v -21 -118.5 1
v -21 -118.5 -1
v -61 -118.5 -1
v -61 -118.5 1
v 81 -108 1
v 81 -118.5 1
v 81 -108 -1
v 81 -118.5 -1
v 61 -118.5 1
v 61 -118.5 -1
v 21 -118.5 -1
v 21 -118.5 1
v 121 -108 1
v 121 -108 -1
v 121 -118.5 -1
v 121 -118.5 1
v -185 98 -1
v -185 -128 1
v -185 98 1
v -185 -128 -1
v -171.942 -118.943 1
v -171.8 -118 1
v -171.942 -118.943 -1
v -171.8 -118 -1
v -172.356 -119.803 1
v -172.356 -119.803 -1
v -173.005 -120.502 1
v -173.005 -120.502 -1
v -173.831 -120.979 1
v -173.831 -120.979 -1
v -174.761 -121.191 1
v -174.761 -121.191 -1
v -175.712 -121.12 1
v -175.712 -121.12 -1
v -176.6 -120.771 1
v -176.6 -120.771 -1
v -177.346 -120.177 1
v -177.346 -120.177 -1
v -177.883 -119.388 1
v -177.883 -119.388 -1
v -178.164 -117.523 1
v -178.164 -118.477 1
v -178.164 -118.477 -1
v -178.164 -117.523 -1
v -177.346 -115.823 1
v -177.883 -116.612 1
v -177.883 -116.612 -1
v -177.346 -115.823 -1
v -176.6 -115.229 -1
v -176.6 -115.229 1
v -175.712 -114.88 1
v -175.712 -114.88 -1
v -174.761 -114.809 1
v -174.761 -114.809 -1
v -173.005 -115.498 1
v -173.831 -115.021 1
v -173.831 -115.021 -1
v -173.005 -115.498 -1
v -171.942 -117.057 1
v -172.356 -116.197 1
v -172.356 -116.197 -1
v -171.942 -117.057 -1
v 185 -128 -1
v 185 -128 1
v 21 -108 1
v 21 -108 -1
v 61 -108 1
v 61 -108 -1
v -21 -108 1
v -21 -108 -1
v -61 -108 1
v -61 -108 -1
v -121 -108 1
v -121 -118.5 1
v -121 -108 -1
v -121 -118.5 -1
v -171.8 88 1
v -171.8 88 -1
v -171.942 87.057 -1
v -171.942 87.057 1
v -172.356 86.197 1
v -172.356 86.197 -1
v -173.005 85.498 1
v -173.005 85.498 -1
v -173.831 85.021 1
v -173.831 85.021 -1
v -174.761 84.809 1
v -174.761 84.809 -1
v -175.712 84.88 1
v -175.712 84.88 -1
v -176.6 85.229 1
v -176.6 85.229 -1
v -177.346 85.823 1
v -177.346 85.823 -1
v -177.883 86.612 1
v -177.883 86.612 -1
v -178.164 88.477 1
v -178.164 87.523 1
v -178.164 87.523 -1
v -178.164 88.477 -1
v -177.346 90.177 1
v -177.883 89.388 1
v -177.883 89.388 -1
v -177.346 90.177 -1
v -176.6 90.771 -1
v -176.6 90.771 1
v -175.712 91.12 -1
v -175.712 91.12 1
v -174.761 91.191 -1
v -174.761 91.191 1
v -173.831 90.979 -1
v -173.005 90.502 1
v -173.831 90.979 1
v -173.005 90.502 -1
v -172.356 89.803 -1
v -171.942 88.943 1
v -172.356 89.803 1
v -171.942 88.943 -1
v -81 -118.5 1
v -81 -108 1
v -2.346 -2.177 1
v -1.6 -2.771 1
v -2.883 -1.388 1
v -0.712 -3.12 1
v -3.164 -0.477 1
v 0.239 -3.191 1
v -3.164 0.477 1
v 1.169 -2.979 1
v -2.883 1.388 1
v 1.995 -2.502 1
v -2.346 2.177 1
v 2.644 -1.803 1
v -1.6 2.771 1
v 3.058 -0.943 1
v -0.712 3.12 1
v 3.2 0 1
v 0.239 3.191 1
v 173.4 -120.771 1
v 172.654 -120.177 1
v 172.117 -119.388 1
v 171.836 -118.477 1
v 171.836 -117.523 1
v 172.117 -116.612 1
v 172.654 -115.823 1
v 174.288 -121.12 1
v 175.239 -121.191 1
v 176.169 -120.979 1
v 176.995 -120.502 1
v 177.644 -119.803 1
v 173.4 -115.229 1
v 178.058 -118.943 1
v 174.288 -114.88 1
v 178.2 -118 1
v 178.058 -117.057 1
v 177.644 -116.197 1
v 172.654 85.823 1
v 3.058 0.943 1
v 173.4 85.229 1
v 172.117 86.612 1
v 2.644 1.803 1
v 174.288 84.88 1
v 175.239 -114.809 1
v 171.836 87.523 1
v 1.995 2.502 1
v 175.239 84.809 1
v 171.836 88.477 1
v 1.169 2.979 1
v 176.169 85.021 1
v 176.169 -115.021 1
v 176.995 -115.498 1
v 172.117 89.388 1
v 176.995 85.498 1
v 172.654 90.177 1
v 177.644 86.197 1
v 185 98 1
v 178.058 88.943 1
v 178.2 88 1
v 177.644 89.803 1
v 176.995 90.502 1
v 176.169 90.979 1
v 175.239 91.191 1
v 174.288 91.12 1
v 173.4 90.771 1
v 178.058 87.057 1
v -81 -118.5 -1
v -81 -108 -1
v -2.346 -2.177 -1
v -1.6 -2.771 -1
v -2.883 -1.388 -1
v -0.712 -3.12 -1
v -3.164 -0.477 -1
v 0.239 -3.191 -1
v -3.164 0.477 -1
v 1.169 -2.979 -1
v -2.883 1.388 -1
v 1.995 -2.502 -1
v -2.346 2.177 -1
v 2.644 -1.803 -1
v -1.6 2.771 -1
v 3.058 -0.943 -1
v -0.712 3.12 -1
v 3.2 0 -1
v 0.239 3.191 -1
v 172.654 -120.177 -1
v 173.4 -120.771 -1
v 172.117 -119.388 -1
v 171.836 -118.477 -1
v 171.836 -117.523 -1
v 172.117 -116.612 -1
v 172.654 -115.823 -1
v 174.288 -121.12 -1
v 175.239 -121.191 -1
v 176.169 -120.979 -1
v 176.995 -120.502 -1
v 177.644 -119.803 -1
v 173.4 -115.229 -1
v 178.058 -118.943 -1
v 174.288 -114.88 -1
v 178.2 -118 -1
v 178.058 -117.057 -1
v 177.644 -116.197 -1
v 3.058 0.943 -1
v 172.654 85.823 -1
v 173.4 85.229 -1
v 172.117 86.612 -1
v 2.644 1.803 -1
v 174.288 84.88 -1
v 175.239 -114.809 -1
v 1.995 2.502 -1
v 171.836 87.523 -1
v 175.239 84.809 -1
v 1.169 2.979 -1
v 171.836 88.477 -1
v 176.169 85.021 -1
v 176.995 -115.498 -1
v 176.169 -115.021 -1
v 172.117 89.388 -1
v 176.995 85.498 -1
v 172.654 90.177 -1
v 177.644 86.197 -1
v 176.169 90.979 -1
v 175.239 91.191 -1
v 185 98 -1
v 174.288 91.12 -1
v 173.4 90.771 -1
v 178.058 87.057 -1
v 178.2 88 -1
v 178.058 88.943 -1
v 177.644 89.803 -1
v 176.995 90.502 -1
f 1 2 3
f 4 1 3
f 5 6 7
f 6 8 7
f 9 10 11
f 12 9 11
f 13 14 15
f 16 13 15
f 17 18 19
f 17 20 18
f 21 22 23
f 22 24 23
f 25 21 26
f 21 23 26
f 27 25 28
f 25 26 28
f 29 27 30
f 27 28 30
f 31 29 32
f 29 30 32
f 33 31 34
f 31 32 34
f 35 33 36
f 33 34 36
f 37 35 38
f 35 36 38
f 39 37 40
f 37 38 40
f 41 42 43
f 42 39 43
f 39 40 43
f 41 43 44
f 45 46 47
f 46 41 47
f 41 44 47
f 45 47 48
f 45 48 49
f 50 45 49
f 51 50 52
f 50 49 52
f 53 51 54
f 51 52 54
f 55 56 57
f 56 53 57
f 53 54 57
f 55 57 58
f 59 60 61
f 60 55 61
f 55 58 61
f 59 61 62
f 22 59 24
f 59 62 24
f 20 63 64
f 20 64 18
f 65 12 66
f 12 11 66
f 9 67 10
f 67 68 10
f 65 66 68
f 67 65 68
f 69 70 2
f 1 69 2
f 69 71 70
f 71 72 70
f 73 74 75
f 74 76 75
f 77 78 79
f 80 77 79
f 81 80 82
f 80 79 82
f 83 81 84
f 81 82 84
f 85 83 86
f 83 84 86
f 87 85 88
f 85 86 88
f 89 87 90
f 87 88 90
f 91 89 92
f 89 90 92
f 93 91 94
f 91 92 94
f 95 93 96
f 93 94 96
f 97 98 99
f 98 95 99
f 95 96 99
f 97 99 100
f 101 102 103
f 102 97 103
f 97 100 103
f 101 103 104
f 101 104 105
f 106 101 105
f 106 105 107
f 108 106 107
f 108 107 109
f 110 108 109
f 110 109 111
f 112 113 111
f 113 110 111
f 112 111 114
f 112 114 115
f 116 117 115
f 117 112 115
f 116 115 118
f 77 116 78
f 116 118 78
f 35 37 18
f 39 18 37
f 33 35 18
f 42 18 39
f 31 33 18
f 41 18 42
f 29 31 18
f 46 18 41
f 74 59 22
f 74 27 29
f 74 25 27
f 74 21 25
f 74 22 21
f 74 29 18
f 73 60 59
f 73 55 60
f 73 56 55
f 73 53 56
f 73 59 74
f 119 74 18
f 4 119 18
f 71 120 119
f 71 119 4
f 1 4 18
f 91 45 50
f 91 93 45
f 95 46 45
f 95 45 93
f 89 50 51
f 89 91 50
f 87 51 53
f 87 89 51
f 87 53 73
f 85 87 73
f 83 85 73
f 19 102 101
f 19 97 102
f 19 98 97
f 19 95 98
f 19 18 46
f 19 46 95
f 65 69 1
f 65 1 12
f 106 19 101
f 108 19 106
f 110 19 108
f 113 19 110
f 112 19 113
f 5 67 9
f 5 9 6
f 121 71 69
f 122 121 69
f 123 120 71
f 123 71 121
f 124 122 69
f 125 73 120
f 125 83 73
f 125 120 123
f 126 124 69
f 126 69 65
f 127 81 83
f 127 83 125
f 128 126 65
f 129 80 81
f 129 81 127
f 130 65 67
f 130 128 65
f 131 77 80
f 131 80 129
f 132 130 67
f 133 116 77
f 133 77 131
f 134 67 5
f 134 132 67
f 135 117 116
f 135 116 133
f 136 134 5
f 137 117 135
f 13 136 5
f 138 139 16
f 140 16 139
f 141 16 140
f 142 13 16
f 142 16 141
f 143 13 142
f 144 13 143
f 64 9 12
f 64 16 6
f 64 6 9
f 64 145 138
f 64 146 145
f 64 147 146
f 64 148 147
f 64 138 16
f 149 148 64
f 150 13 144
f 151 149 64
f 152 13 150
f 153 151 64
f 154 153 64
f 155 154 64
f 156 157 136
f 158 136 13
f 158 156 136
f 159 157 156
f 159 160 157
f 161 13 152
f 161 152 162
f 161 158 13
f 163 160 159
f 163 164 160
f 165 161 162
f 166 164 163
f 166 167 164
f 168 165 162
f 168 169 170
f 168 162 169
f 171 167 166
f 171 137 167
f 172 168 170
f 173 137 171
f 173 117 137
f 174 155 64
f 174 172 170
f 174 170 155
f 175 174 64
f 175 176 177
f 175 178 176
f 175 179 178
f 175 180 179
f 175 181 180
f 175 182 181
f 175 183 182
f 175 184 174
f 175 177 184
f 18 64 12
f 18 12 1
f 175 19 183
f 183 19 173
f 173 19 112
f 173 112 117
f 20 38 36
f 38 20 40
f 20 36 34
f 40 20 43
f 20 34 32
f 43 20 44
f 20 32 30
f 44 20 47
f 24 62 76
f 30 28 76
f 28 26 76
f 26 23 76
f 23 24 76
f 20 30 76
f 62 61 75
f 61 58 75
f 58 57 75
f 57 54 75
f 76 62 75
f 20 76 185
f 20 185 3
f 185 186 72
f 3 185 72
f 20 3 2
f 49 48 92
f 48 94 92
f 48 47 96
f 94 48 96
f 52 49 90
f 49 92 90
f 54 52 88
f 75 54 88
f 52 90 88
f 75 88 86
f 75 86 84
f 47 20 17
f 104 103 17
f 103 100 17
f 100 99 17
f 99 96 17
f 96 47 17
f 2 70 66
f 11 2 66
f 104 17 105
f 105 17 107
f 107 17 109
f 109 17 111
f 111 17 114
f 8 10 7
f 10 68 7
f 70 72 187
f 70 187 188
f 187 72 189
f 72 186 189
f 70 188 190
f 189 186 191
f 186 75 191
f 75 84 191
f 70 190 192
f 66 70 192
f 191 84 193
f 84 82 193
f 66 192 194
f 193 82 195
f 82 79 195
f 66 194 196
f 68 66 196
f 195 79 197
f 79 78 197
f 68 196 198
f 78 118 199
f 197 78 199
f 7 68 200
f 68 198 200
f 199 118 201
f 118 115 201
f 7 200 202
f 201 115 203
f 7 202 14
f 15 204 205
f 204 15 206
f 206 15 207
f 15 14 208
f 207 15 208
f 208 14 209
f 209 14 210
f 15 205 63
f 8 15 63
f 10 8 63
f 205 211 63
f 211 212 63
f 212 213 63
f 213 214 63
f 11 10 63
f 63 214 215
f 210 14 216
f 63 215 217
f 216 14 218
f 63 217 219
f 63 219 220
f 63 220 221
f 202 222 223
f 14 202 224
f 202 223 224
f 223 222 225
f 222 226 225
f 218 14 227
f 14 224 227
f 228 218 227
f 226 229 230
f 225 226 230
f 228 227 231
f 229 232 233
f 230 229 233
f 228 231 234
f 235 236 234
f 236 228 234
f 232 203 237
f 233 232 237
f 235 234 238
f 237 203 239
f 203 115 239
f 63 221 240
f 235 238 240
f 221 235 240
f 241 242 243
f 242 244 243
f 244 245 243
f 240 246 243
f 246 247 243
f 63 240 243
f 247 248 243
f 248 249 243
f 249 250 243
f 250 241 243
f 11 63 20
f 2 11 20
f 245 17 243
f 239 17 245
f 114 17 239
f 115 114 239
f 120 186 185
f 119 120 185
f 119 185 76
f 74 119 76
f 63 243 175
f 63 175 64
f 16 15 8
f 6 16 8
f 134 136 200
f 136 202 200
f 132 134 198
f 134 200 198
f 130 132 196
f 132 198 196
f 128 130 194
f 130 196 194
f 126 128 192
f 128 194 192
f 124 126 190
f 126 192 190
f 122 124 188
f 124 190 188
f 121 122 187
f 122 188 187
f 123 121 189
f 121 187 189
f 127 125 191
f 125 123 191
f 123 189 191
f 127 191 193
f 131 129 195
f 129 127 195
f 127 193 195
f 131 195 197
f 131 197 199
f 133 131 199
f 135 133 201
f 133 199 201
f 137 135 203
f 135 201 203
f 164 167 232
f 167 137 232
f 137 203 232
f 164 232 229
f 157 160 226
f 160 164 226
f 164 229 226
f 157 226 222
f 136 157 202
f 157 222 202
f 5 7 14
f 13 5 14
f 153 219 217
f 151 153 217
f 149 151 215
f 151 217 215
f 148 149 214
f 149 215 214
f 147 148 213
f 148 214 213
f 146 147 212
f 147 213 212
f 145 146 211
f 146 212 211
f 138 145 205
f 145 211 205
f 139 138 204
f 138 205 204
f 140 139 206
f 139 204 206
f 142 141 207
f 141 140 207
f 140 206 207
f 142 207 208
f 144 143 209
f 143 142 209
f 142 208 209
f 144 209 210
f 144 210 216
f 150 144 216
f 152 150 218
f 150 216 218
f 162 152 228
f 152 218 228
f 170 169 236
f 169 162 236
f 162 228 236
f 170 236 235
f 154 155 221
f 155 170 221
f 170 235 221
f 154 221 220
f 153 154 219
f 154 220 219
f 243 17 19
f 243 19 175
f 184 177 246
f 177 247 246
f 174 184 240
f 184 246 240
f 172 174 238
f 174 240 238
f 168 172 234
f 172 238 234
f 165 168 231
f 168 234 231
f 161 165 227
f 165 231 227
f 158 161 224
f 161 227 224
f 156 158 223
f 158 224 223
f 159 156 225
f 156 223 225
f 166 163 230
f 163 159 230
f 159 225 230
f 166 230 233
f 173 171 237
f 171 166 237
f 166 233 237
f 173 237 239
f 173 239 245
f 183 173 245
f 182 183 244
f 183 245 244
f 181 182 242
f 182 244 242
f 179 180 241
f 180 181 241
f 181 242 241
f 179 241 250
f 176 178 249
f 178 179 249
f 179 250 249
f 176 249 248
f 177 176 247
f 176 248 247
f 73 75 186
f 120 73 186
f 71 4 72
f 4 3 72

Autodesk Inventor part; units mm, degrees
ref_plane "YZ Plane" through (0, 0, 0) normal (1, 0, 0) x (0, 1, 0)
ref_plane "XZ Plane" through (0, 0, 0) normal (0, 1, 0) x (-1, 0, 0)
ref_plane "XY Plane" through (0, 0, 0) normal (0, 0, 1) x (1, 0, 0)
sketch "Sketch2" plane through (0, 0, 0) normal (0, 0, 1) x (1, 0, 0)
  circle A0 centre (175, 88) radius 3.2
  circle A1 centre (175, -118) radius 3.2
  circle A2 centre (-175, -118) radius 3.2
  circle A3 centre (-175, 88) radius 3.2
  line L0 (-185, 98) -> (185, 98)
  line L1 (185, 98) -> (185, -128)
  line L2 (185, -128) -> (-185, -128)
  line L3 (-185, -128) -> (-185, 98)
  line L4 (-121, -108) -> (-81, -108)
  line L5 (-81, -108) -> (-81, -118.5)
  line L6 (-81, -118.5) -> (-121, -118.5)
  line L7 (-121, -118.5) -> (-121, -108)
  line L8 (-61, -108) -> (-21, -108)
  line L9 (-21, -108) -> (-21, -118.5)
  line L10 (-21, -118.5) -> (-61, -118.5)
  line L11 (-61, -118.5) -> (-61, -108)
  line L12 (21, -108) -> (61, -108)
  line L13 (61, -108) -> (61, -118.5)
  line L14 (61, -118.5) -> (21, -118.5)
  line L15 (21, -118.5) -> (21, -108)
  line L16 (81, -108) -> (121, -108)
  line L17 (121, -108) -> (121, -118.5)
  line L18 (121, -118.5) -> (81, -118.5)
  line L19 (81, -118.5) -> (81, -108)
  circle A4 centre (0, 0) radius 3.2
extrude "Extrusion2" add sketch "Sketch2" along normal mid plane 2
properties part number "bottom_plate"
